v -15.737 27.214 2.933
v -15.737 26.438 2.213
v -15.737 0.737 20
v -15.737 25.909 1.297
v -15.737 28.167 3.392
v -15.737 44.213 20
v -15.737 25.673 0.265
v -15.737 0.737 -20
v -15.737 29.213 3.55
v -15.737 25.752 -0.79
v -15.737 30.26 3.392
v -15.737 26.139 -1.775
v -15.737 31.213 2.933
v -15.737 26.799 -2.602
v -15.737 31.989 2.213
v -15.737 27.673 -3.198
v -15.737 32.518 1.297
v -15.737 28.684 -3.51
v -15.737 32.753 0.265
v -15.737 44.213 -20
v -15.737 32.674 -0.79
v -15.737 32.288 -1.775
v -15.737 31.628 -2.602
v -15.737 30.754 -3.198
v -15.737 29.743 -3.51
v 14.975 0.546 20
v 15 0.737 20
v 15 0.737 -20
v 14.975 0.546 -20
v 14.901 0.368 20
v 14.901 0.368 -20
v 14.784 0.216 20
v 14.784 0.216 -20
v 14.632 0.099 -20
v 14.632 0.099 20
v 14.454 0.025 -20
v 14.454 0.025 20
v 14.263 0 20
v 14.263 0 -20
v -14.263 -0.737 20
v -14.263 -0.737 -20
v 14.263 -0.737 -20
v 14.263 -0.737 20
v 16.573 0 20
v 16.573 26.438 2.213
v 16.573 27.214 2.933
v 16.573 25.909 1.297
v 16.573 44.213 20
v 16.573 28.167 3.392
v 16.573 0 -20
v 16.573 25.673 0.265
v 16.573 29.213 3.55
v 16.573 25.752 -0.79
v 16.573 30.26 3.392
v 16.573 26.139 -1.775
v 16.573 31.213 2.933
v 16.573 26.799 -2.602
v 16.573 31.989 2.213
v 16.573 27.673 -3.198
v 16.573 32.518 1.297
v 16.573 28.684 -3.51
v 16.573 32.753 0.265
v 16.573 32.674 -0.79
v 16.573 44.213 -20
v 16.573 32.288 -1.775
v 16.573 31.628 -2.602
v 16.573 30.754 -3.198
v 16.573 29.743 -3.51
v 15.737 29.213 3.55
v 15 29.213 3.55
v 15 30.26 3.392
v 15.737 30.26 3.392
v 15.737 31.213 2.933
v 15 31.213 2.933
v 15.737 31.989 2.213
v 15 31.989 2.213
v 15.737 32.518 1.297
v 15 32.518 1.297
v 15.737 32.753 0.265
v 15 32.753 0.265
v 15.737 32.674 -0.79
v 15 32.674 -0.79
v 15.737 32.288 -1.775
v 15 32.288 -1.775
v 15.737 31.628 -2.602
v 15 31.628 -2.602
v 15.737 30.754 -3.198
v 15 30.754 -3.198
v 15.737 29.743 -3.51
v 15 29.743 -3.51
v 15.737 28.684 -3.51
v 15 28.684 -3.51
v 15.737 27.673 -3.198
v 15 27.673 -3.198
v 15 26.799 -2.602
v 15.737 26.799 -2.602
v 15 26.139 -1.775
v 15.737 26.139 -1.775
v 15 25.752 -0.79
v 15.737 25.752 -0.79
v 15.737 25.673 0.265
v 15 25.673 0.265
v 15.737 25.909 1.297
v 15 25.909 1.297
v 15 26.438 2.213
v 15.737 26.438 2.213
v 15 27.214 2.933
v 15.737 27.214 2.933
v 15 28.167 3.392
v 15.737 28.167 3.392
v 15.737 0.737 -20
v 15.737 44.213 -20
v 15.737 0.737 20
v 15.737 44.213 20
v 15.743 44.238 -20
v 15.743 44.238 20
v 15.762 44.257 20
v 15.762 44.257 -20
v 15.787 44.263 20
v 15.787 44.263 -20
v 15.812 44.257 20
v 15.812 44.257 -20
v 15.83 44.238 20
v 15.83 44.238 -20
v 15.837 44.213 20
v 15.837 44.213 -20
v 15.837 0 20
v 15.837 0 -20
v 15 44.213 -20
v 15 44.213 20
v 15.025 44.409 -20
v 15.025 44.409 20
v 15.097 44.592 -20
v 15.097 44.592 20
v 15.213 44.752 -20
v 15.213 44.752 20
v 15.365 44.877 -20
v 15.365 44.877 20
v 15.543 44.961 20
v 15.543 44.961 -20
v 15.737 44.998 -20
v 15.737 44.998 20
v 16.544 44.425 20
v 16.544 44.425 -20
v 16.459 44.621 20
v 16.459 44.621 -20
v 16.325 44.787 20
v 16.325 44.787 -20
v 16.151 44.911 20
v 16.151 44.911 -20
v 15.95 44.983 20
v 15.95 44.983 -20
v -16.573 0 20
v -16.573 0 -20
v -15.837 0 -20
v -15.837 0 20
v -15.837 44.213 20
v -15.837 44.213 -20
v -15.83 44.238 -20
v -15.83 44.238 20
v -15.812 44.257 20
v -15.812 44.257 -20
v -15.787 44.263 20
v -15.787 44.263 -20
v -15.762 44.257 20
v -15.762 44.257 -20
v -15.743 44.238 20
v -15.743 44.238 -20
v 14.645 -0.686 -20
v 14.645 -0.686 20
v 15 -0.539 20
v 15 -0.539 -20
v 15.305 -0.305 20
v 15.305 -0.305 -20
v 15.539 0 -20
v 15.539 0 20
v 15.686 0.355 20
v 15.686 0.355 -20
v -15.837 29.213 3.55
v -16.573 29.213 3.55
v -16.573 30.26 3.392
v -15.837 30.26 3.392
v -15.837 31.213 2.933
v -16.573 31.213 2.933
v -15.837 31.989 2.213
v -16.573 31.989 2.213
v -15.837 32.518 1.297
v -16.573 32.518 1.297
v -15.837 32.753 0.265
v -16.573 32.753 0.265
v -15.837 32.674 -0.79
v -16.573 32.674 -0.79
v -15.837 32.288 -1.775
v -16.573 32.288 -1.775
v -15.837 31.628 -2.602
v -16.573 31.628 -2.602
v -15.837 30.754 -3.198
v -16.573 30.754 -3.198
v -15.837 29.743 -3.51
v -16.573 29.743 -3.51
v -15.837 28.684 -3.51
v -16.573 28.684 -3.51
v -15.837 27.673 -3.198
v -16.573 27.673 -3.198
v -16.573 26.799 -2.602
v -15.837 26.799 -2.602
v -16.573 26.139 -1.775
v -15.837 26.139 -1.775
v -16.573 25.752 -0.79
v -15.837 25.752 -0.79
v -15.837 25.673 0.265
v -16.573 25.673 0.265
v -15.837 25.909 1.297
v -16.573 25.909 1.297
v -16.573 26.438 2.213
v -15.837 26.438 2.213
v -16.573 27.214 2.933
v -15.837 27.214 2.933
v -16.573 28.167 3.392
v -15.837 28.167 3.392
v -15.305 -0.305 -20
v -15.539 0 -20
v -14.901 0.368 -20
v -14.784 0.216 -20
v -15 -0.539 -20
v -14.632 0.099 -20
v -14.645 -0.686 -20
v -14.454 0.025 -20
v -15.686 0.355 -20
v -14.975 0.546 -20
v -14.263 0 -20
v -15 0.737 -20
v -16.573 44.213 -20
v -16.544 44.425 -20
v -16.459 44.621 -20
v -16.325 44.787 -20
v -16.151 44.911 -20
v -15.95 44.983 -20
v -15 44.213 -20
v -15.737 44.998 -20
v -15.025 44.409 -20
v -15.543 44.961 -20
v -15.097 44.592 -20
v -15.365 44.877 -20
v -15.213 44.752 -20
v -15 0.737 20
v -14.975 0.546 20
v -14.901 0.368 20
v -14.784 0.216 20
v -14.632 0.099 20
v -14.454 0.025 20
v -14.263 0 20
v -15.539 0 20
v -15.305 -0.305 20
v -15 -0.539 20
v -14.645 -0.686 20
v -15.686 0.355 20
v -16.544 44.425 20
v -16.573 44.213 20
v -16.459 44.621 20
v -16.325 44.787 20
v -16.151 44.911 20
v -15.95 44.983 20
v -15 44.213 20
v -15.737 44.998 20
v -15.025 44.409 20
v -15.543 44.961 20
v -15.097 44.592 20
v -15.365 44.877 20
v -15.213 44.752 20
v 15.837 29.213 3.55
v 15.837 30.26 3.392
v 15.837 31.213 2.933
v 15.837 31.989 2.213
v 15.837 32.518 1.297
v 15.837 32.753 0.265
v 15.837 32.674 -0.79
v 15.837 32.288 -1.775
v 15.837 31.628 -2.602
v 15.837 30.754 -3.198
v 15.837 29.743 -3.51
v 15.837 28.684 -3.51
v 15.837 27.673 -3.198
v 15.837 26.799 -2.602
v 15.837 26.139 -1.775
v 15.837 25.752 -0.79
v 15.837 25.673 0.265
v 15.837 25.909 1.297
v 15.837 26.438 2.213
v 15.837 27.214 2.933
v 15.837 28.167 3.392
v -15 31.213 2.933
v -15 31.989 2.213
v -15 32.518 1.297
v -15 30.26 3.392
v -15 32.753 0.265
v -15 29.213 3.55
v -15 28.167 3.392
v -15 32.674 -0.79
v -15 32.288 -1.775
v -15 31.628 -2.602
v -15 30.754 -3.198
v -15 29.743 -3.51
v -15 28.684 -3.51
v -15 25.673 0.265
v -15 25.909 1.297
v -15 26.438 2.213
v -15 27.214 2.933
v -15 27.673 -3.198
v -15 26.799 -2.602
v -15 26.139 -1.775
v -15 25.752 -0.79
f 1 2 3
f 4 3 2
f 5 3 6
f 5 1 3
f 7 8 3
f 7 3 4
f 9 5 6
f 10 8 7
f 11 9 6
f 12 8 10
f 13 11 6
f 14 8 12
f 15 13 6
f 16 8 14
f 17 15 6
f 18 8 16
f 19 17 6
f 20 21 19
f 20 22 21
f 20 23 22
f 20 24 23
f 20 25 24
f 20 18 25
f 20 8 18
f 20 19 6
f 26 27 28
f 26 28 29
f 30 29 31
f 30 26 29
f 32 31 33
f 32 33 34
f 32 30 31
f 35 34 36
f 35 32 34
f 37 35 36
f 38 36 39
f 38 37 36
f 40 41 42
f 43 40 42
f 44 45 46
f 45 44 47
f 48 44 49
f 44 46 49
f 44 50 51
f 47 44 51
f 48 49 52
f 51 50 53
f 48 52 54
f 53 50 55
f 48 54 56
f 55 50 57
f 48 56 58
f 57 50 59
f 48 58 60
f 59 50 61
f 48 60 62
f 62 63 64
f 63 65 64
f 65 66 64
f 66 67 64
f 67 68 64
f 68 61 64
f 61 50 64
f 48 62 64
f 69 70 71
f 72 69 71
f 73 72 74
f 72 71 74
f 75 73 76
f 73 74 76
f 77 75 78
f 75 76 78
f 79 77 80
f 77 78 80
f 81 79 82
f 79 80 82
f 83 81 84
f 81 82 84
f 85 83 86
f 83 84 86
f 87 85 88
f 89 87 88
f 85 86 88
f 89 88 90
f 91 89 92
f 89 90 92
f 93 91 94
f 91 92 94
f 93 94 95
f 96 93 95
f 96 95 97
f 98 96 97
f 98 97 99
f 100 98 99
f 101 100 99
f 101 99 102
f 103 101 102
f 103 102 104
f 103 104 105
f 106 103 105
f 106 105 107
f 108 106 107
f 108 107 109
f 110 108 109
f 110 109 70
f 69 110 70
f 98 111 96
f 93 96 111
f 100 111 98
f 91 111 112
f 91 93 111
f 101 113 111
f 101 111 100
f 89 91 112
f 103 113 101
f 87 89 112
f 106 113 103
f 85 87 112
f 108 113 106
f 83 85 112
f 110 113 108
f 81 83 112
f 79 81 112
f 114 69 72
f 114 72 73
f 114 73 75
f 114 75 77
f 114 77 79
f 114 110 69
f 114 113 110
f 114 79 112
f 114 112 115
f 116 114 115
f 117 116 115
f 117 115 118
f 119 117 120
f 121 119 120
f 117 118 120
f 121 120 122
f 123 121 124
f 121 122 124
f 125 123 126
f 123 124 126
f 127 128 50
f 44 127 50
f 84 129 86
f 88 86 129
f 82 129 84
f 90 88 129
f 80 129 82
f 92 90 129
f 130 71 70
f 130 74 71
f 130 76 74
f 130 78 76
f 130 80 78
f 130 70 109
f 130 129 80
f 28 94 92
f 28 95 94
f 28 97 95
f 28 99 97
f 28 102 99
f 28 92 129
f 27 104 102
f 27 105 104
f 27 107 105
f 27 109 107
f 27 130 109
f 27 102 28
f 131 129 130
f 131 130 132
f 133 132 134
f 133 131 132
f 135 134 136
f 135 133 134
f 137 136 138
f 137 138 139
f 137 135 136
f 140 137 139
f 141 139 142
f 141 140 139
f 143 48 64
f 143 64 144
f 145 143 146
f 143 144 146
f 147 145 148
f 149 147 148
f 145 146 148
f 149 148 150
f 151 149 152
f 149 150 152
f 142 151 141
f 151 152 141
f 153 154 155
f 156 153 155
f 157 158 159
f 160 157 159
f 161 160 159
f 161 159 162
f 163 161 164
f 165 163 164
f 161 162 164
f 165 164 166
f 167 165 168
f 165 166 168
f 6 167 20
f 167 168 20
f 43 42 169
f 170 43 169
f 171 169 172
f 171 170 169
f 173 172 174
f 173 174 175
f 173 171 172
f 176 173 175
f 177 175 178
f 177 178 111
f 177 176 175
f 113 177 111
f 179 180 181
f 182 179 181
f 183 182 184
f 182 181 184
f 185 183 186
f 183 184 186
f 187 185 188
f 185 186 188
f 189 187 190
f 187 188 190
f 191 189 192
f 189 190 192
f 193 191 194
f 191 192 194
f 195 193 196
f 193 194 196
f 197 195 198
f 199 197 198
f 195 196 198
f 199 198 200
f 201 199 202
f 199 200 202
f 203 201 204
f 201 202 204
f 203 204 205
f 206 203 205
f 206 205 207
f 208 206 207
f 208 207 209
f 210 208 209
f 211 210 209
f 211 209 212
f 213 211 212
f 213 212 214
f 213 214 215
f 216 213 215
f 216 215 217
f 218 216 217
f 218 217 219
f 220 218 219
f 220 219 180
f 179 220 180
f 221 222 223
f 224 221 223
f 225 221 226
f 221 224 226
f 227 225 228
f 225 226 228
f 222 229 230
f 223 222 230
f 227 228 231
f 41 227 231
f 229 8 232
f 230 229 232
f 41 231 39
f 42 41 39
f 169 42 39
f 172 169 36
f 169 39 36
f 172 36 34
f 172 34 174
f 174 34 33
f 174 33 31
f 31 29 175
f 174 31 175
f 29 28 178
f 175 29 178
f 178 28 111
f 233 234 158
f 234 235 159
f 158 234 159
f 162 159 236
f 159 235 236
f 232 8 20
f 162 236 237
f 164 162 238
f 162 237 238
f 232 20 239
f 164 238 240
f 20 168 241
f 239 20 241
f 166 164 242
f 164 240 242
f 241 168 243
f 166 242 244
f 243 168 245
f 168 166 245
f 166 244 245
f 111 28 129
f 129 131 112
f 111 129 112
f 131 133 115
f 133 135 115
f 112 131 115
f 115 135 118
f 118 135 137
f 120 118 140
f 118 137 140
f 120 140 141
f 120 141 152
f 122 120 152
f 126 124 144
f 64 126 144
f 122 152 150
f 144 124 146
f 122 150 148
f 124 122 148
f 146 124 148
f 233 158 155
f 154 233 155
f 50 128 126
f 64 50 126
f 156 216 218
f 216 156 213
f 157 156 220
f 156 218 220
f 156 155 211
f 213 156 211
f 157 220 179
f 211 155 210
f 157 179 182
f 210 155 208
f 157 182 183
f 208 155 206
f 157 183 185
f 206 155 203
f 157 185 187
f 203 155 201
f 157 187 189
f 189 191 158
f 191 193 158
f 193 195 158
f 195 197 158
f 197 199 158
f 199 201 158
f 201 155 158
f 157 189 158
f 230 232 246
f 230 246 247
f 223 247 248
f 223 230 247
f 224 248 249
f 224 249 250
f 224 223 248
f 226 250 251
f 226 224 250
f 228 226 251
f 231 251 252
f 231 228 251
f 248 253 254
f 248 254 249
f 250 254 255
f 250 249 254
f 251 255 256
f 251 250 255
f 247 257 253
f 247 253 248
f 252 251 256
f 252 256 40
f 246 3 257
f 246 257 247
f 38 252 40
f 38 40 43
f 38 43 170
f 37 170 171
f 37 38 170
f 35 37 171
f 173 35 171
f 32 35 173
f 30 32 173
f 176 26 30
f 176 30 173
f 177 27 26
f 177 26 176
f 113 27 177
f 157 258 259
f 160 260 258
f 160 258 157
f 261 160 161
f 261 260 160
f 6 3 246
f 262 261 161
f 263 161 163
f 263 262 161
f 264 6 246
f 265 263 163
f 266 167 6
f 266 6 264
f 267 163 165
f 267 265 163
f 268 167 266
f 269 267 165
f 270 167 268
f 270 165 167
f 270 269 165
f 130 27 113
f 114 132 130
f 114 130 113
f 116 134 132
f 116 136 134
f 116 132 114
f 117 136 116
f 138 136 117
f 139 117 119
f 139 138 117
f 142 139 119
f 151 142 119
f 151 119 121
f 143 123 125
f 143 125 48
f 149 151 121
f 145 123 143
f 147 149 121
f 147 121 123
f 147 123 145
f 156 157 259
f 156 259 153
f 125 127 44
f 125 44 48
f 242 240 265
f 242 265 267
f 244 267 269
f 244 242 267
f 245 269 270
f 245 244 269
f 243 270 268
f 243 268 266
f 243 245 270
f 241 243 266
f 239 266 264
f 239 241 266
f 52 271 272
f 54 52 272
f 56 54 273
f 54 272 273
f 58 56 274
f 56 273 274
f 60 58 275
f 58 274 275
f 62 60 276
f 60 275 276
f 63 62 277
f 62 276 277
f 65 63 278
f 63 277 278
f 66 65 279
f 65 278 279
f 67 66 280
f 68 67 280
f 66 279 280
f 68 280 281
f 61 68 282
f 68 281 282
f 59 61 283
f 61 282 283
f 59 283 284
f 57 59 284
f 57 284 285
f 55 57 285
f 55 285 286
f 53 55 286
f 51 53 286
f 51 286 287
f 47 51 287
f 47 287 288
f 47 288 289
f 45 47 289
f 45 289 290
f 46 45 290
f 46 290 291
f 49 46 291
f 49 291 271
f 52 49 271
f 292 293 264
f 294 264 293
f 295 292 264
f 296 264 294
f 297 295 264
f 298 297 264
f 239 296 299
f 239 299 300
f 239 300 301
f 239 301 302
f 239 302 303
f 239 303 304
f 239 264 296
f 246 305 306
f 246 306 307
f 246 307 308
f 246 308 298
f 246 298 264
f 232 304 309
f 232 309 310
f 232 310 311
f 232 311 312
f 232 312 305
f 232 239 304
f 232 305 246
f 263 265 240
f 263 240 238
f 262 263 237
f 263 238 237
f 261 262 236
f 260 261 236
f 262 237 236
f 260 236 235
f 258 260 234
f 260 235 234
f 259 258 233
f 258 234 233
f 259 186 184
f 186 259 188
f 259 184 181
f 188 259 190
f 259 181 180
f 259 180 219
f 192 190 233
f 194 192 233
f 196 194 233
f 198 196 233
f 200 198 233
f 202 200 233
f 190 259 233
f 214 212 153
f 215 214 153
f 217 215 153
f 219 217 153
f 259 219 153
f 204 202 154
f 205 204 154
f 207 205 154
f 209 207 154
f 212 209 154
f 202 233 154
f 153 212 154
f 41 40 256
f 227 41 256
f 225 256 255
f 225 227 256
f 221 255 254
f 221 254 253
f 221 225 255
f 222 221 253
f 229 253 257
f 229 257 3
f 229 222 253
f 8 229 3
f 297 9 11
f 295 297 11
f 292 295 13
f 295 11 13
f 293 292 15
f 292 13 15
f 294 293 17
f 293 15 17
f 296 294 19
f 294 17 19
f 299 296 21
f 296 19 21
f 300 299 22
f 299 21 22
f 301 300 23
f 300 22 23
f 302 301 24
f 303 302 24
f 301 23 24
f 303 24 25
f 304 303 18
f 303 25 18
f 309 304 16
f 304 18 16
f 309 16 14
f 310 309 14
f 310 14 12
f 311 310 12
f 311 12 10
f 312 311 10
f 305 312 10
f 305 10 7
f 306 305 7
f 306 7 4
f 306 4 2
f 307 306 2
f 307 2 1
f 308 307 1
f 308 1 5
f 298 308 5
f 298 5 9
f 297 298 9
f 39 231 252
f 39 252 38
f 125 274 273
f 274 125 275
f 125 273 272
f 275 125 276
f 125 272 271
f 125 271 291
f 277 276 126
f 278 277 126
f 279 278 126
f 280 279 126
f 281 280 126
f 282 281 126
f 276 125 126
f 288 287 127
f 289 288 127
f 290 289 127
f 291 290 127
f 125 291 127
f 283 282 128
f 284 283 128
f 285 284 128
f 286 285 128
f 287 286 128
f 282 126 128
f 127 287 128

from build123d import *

# Parameters (mm, degrees)
SKETCH1_W                      = 30
SKETCH1_H                      = 40
BASE_FLANGE1_DEPTH             = 0.7366
EDGE_FLANGE1_STRIP_W           = 4.4196
EDGE_FLANGE1_STRIP_H           = 0.7366
EDGE_FLANGE1_STRIP_CUT_DEPTH   = 40
EDGE_FLANGE1_STRIP_2_W         = 4.4196
EDGE_FLANGE1_STRIP_2_H         = 0.7366
EDGE_FLANGE1_STRIP_CUT_2_DEPTH = 40
EDGE_FLANGE1_DEPTH             = 40
EDGE_FLANGE1_BEND_DEPTH        = 40
HEM1_START                     = -20
HEM1_DEPTH                     = 40
HEM1_2_DEPTH                   = 40
F_7_1_7_1_DIAMETER_HOLE1_D     = 7.1


# Read off the part's stored shape, not the designer's step: Hem1
# Sheet-metal steps are written as plain solids
with BuildPart() as part:
    # Sketch1 → Base-Flange1 (new body)
    with BuildSketch(Plane(origin=(0, 0, 0), x_dir=(1, 0, 0), z_dir=(0, 1, 0))):
        Rectangle(SKETCH1_W, SKETCH1_H)
    extrude(amount=-BASE_FLANGE1_DEPTH)

    # Edge-Flange1 strip (across the edge) → Edge-Flange1 strip cut (cut)
    with BuildSketch(Plane(origin=(15, 0, 20), x_dir=(-1, 0, 0), z_dir=(0, 0, -1))):
        with Locations((-1.4732, -0.3683)):
            Rectangle(EDGE_FLANGE1_STRIP_W, EDGE_FLANGE1_STRIP_H)
    extrude(amount=EDGE_FLANGE1_STRIP_CUT_DEPTH, mode=Mode.SUBTRACT)

    # Edge-Flange1 strip 2 (across the edge) → Edge-Flange1 strip cut 2 (cut)
    with BuildSketch(Plane(origin=(-15, 0, -20), x_dir=(1, 0, 0), z_dir=(0, 0, 1))):
        with Locations((-1.4732, -0.3683)):
            Rectangle(EDGE_FLANGE1_STRIP_2_W, EDGE_FLANGE1_STRIP_2_H)
    extrude(amount=EDGE_FLANGE1_STRIP_CUT_2_DEPTH, mode=Mode.SUBTRACT)

    # Edge-Flange1 section (across the edge) → Edge-Flange1 (add)
    with BuildSketch(Plane(origin=(15, 0, 20), x_dir=(-1, 0, 0), z_dir=(0, 0, -1))):
        with BuildLine():
            Line((-0.7366, 0.7366), (-0.7366, 45))
            Line((-0.7366, 45), (0, 45))
            Line((0, 45), (0, 0.7366))
            ThreePointArc((0, 0.7366), (0.215745145, 0.215745145), (0.7366, 0))
            Line((0.7366, 0), (0.7366, -0.7366))
            ThreePointArc((0.7366, -0.7366), (-0.30510971, -0.30510971), (-0.7366, 0.7366))
        make_face()
    extrude(amount=EDGE_FLANGE1_DEPTH)

    # Edge-Flange1 section 2 (across the edge) → Edge-Flange1 bend (add)
    with BuildSketch(Plane(origin=(-15, 0, -20), x_dir=(1, 0, 0), z_dir=(0, 0, 1))):
        with BuildLine():
            Line((-0.7366, 0.7366), (-0.7366, 45))
            Line((-0.7366, 45), (0, 45))
            Line((0, 45), (0, 0.7366))
            ThreePointArc((0, 0.7366), (0.215745145, 0.215745145), (0.7366, 0))
            Line((0.7366, 0), (0.7366, -0.7366))
            ThreePointArc((0.7366, -0.7366), (-0.30510971, -0.30510971), (-0.7366, 0.7366))
        make_face()
    extrude(amount=EDGE_FLANGE1_BEND_DEPTH)

    # Hem1 outline → Hem1 (cut)
    with BuildSketch(Plane.XY.offset(HEM1_START)):
        with BuildLine():
            ThreePointArc((15, 44.2134), (15.212984467, 44.751642306), (15.7366, 44.998409274))
            Line((15.7366, 44.998409274), (15.7366, 45))
            Line((15.7366, 45), (15, 45))
            Line((15, 45), (15, 44.2134))
        make_face()
        with BuildLine():
            Line((-15.7366, 45), (-15.7366, 44.998409274))
            ThreePointArc((-15.7366, 44.998409274), (-15.212984467, 44.751642306), (-15, 44.2134))
            Line((-15, 44.2134), (-15, 45))
            Line((-15, 45), (-15.7366, 45))
        make_face()
    extrude(amount=HEM1_DEPTH, mode=Mode.SUBTRACT)

    # Hem1 2 outline → Hem1 2 (add)
    with BuildSketch(Plane.XY.offset(HEM1_START)):
        with BuildLine():
            Line((15.8366, 0), (16.5732, 0))
            Line((16.5732, 0), (16.5732, 44.2134))
            ThreePointArc((16.5732, 44.2134), (16.324842306, 44.787015533), (15.7366, 44.998409274))
            Line((15.7366, 44.998409274), (15.7366, 44.2134))
            ThreePointArc((15.7366, 44.2134), (15.7866, 44.2634), (15.8366, 44.2134))
            Line((15.8366, 44.2134), (15.8366, 0))
        make_face()
        with BuildLine():
            Line((-16.5732, 0), (-15.8366, 0))
            Line((-15.8366, 0), (-15.8366, 44.2134))
            ThreePointArc((-15.8366, 44.2134), (-15.7866, 44.2634), (-15.7366, 44.2134))
            Line((-15.7366, 44.2134), (-15.7366, 44.998409274))
            ThreePointArc((-15.7366, 44.998409274), (-16.324842306, 44.787015533), (-16.5732, 44.2134))
            Line((-16.5732, 44.2134), (-16.5732, 0))
        make_face()
    extrude(amount=HEM1_2_DEPTH)

    # Ø7.1 (7.1) Diameter Hole1 (through all)
    with Locations(Plane(origin=(16.5732, 0, 0), x_dir=(0, 0, -1), z_dir=(1, 0, 0))):
        with Locations((0, 29.2134)):
            Hole(F_7_1_7_1_DIAMETER_HOLE1_D / 2)


solid = part.part
